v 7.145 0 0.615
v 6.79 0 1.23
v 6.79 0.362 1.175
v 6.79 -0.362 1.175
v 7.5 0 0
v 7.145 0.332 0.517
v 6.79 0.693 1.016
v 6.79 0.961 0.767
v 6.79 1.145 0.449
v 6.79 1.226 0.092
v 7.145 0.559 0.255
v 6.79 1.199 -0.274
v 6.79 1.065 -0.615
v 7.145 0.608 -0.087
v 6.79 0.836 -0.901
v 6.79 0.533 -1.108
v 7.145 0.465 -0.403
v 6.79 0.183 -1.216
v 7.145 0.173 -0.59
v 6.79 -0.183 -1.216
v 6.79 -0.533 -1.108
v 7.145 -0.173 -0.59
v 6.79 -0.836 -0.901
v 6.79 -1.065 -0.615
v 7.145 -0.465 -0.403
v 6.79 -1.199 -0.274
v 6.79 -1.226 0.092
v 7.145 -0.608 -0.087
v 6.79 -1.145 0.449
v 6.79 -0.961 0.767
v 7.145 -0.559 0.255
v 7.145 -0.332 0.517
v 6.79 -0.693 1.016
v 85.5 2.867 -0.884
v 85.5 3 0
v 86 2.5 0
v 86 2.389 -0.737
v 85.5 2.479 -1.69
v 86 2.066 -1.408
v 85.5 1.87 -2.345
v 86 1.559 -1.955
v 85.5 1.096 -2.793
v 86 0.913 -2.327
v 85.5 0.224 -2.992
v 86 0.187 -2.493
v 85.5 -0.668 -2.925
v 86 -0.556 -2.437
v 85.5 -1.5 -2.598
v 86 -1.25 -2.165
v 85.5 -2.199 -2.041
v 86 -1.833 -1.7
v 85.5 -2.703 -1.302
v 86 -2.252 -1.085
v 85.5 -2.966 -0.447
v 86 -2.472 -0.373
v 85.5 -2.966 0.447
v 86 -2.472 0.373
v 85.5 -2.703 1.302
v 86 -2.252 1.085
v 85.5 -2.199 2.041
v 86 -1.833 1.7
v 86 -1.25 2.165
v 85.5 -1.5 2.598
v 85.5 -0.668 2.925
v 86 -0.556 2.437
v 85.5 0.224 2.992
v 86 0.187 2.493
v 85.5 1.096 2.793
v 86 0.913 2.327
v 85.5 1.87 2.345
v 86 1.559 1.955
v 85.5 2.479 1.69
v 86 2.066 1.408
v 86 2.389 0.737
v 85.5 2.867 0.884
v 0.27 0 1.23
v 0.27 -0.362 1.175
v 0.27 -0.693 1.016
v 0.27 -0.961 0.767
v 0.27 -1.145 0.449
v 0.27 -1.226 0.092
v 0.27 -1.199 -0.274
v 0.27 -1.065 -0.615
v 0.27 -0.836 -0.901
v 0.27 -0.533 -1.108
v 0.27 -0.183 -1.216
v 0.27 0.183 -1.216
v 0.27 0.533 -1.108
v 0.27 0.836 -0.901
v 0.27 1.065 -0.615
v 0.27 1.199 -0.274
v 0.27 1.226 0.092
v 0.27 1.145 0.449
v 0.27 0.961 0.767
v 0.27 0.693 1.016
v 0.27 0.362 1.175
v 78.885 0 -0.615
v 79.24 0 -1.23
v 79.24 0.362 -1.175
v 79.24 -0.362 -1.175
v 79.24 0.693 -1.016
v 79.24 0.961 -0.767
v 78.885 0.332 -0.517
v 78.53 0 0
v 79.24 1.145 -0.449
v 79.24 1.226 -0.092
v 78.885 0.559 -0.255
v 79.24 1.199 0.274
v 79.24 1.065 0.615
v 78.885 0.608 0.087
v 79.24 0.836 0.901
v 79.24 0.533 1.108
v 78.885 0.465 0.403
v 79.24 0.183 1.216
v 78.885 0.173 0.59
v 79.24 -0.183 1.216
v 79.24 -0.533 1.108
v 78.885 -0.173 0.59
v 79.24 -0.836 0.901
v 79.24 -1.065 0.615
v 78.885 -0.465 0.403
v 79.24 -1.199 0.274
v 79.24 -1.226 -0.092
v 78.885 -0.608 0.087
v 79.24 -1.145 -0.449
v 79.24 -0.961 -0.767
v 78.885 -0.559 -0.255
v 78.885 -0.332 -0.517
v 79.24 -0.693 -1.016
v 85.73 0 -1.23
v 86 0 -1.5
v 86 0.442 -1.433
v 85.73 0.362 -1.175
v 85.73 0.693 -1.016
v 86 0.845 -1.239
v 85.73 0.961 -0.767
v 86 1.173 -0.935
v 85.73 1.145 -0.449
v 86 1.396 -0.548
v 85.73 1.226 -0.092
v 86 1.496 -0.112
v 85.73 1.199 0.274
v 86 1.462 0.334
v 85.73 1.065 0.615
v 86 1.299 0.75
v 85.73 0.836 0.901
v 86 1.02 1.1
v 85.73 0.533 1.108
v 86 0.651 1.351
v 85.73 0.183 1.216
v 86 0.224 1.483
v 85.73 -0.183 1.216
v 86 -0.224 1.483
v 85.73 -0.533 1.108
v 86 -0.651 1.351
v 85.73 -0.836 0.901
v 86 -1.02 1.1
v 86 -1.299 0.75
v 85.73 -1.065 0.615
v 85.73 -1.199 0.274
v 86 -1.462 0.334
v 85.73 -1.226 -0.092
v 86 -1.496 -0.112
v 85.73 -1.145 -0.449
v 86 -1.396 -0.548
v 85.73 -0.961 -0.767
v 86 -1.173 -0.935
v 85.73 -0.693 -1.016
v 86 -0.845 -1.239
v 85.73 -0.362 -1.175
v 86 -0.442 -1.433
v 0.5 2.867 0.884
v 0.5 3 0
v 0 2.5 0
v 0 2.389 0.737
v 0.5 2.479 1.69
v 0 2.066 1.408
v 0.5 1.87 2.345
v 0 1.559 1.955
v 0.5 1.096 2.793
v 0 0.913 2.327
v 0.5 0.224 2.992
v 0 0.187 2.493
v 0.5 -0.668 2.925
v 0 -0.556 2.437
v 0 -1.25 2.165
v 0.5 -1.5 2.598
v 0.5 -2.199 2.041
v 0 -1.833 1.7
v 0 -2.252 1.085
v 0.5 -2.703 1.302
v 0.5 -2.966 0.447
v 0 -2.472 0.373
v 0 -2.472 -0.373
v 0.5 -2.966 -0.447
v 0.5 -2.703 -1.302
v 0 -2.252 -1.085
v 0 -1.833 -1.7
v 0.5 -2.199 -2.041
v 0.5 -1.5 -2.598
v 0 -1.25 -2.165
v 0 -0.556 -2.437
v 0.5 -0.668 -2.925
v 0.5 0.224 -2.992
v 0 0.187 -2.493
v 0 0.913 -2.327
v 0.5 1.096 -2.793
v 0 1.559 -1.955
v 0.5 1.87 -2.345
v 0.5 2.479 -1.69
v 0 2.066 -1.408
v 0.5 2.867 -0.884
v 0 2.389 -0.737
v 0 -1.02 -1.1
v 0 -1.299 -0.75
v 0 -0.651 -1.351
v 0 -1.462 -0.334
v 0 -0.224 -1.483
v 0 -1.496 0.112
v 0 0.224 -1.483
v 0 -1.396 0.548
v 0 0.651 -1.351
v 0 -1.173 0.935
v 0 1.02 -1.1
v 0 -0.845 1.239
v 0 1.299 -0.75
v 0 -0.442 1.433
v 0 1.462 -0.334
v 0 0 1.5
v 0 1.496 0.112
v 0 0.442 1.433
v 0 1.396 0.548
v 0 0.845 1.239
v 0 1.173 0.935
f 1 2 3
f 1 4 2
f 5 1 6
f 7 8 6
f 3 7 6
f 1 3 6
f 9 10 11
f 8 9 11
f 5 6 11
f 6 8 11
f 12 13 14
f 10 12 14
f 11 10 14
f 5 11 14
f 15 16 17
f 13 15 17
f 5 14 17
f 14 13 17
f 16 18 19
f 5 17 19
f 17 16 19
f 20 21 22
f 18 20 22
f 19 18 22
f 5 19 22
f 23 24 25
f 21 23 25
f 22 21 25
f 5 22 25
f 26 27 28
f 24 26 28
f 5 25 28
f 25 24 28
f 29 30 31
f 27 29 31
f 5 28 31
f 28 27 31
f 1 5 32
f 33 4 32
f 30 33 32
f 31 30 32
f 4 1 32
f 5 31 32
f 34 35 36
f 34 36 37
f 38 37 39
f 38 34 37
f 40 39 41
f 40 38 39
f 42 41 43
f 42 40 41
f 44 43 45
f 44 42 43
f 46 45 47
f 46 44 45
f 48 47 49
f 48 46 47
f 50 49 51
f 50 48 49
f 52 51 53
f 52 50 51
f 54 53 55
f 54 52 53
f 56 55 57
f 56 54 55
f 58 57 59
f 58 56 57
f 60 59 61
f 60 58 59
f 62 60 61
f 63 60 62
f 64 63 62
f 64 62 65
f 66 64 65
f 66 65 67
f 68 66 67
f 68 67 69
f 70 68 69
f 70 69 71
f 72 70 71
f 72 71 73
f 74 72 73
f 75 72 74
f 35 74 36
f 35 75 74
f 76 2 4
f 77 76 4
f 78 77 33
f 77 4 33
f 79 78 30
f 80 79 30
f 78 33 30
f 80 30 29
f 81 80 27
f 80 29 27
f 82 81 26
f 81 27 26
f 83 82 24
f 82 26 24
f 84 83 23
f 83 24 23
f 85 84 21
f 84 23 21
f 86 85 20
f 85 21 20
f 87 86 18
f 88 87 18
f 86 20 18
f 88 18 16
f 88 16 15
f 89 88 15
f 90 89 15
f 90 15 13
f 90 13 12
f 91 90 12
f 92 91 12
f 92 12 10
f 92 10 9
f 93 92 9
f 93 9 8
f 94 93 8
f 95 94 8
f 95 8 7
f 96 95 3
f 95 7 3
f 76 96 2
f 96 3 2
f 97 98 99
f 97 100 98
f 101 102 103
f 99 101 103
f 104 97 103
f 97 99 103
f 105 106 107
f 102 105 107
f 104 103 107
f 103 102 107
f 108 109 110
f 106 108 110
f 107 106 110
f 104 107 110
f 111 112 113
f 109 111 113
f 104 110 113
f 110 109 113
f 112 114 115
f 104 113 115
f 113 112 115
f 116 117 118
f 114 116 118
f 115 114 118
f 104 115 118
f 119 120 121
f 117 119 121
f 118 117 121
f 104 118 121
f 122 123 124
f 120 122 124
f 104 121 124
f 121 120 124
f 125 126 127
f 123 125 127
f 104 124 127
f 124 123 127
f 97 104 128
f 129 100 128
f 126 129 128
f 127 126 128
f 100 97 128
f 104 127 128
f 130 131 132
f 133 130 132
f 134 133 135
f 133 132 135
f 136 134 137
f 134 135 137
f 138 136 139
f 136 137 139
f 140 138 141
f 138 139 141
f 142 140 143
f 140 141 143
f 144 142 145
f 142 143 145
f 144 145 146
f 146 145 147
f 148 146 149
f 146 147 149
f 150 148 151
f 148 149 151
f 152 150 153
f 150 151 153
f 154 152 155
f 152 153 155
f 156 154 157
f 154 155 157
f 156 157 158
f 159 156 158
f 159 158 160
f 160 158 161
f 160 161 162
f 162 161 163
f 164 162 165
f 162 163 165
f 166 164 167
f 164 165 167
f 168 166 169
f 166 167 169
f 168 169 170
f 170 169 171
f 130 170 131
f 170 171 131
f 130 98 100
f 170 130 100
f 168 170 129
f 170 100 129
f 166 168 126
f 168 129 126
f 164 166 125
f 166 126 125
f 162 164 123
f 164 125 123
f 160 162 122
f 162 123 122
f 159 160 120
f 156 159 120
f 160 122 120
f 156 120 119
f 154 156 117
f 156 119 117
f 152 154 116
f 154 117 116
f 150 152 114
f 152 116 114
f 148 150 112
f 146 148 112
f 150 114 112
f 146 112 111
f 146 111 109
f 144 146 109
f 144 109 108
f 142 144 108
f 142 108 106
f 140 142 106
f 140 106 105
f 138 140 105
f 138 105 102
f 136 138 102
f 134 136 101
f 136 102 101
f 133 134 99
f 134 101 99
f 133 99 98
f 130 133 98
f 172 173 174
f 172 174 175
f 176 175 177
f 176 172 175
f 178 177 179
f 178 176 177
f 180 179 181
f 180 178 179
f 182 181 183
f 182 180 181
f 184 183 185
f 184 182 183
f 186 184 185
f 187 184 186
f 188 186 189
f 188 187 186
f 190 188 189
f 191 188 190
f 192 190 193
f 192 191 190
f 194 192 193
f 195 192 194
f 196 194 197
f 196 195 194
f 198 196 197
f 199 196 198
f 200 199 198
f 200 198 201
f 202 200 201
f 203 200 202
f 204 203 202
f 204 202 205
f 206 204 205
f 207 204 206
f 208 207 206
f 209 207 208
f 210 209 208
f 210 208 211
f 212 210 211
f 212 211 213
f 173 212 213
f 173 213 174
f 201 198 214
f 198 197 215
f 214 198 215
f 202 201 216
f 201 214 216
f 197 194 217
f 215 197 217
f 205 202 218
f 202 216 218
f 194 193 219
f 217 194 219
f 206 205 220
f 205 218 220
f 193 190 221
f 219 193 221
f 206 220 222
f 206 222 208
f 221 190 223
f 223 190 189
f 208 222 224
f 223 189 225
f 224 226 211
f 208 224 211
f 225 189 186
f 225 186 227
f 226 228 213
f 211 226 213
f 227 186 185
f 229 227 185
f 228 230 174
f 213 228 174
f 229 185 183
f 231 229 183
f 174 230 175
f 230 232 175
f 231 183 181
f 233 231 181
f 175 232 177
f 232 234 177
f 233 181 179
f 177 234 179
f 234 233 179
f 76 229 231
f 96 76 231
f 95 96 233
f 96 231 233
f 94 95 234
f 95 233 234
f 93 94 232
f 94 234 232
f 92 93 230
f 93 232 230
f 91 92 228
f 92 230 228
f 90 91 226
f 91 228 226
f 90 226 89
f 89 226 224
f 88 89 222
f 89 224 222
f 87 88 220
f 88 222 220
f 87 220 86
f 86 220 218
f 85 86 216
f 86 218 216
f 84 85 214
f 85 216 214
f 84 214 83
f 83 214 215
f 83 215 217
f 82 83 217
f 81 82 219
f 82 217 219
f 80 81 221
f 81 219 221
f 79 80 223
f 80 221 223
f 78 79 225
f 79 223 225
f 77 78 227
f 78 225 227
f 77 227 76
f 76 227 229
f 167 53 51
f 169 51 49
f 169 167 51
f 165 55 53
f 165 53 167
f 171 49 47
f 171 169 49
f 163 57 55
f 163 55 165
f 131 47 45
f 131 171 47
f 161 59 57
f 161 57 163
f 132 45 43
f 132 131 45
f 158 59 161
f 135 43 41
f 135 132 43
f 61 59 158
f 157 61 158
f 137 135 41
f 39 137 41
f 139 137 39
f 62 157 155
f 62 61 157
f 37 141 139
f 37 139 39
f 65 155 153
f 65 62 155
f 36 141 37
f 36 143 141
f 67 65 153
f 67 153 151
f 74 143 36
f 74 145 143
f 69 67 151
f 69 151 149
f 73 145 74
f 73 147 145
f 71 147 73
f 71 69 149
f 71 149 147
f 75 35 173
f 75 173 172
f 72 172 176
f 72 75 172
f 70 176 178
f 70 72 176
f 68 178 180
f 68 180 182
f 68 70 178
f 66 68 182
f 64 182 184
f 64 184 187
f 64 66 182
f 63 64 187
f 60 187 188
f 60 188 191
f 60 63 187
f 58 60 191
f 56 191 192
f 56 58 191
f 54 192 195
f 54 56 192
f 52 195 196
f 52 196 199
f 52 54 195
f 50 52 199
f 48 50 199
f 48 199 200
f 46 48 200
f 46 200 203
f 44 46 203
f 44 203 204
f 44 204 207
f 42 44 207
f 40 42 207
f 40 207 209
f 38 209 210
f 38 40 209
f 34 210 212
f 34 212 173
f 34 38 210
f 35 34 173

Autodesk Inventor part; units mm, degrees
ref_plane "YZ Plane" through (0, 0, 0) normal (1, 0, 0) x (0, 1, 0)
ref_plane "XZ Plane" through (0, 0, 0) normal (0, 1, 0) x (-1, 0, 0)
ref_plane "XY Plane" through (0, 0, 0) normal (0, 0, 1) x (1, 0, 0)
sketch "Sketch_1" plane through (0, 0, 0) normal (0, 0, 1) x (1, 0, 0)
  line L0 (86, 0) -> (0, 0)
  line L1 (0, 0) -> (0, 2.5)
  line L2 (0, 2.5) -> (0.5, 3)
  line L3 (0.5, 3) -> (85.5, 3)
  line L4 (85.5, 3) -> (86, 2.5)
  line L5 (86, 2.5) -> (86, 0)
  line L6 (86, 0) -> (0, 0)
revolve "Revolution1" add sketch "Sketch_1" angle 360 about axis through (86, 0, 0) along (1, 0, 0)
sketch "Sketch2" plane through (0, 0, 0) normal (-1, 0, 0) x (0, 0, 1)
  point P0 (0, 0)
hole "Hole1" at (0, 0, 0) direction (1, 0, 0) diameter 2.459 depth 6.7901 tip angle 120 countersink diameter 3 countersink angle 90 thread size "M3x0.5" class "6H" standard "ISO Metric profile"
sketch "Sketch3" plane through (86, 0, 0) normal (1, 0, 0) x (0, 0, -1)
  point P0 (0, 0)
hole "Hole2" at (86, 0, 0) direction (-1, 0, 0) diameter 2.459 depth 6.7601 tip angle 120 countersink diameter 3 countersink angle 90 thread size "M3x0.5" class "6H" standard "ISO Metric profile"
properties part number "RDOB6-86-WMC3"
